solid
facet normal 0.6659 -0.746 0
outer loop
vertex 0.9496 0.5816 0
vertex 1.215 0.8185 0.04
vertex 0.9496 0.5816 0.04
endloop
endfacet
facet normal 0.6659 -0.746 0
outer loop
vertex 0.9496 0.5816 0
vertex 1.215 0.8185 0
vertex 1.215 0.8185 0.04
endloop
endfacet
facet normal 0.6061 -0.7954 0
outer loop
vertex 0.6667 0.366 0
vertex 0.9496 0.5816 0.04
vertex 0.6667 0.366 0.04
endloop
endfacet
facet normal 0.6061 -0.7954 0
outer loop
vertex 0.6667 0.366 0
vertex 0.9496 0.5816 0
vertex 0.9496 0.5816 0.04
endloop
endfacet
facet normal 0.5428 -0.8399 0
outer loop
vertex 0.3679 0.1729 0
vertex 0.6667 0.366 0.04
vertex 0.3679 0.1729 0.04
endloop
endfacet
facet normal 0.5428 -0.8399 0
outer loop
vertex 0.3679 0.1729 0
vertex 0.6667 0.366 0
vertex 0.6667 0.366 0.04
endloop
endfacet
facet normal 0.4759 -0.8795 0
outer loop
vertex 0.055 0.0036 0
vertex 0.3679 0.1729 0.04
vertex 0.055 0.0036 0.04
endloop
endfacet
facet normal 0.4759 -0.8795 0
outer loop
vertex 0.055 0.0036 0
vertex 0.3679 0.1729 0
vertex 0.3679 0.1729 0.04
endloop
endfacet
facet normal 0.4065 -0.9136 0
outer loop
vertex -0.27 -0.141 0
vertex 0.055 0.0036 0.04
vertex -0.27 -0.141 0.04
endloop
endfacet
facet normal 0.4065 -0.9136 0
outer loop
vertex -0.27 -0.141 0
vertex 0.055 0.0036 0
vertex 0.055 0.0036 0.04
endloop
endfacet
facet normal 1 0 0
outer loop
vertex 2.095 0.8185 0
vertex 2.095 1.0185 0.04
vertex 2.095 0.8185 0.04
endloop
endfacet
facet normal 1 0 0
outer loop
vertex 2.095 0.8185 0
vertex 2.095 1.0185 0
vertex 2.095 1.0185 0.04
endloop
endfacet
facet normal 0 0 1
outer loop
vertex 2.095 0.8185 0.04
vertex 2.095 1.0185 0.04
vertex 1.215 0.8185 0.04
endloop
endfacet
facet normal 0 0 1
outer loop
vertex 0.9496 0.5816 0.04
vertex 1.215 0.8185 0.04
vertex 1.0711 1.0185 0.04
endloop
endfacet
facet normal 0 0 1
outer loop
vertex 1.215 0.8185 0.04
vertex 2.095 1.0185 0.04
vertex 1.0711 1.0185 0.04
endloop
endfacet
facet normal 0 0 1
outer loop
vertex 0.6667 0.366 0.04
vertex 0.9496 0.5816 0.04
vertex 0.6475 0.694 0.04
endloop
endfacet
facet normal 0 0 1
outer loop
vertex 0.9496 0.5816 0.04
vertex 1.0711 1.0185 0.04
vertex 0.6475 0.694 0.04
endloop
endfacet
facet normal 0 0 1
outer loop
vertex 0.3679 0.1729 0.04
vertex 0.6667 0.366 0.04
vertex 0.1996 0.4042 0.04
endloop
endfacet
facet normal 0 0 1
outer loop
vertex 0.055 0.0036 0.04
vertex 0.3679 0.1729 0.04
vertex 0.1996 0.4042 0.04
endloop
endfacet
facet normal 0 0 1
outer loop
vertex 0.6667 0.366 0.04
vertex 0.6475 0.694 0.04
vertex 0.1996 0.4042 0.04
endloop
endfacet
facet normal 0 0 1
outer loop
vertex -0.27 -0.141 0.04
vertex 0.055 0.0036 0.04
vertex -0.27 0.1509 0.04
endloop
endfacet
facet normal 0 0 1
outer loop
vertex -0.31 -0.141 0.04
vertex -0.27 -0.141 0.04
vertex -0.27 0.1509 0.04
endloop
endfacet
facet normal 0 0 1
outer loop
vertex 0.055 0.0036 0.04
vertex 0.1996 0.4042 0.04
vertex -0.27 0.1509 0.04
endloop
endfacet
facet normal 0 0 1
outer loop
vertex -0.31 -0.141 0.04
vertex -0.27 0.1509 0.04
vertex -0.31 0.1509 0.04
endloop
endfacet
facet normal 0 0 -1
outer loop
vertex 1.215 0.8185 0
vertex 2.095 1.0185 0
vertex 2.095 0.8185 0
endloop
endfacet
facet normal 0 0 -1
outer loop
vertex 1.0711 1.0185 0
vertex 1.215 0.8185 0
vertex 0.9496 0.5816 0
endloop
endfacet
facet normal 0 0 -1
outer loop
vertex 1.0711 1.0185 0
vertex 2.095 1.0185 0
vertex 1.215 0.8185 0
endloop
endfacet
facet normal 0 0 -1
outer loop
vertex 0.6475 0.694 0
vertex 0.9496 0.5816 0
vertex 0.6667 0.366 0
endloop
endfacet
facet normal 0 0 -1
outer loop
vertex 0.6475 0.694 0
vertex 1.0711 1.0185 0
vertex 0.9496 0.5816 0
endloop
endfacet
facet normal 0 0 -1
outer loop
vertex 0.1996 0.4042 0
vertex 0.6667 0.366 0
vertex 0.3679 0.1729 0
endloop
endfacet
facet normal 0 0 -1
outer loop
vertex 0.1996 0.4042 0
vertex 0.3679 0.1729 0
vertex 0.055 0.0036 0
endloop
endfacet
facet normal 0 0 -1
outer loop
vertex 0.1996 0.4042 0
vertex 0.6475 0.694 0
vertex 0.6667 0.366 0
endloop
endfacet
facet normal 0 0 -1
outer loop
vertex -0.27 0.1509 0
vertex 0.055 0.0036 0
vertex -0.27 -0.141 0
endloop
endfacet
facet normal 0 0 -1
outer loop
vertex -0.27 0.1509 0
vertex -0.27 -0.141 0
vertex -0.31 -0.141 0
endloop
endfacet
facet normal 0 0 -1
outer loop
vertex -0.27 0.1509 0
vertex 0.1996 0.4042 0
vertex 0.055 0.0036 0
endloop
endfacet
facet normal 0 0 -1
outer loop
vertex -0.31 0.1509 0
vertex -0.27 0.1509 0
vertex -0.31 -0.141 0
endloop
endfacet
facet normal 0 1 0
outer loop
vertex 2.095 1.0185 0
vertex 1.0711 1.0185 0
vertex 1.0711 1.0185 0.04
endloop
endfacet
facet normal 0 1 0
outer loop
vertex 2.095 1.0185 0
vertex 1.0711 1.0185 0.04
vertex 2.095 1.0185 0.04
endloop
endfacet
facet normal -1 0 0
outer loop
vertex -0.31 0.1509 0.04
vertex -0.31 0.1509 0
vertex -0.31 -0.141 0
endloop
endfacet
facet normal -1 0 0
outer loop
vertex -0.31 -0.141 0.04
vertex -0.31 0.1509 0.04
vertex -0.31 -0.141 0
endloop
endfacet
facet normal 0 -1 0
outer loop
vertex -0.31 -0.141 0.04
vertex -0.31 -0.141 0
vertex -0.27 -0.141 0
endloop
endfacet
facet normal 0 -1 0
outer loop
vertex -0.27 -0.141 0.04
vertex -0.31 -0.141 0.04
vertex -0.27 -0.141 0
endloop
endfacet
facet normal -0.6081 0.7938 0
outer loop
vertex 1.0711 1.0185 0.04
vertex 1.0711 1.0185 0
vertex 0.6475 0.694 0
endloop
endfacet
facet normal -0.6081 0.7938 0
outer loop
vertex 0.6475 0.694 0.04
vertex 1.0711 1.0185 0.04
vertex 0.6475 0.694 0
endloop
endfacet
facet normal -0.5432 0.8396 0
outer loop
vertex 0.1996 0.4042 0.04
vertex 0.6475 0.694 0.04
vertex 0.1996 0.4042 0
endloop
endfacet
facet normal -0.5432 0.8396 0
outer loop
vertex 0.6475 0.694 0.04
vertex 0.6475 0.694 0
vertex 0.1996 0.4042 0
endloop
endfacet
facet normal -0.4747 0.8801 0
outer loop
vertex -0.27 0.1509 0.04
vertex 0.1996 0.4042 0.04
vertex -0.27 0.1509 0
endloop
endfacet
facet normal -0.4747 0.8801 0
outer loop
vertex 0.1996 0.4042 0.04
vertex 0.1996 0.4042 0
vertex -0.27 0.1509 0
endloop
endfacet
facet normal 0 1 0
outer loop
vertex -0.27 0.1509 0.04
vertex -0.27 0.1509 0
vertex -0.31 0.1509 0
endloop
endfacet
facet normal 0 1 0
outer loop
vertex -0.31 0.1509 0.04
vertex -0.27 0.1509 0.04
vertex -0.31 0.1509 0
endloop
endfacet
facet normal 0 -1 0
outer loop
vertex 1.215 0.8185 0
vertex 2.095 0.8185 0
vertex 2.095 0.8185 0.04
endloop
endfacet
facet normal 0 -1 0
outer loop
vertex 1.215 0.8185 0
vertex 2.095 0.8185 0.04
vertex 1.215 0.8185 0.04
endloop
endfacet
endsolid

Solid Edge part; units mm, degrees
sketch "Sketch1" plane through (0, 0, 0) normal (0, 0, 1) x (1, 0, 0)
  line L0 (2.095, 1.0185) -> (2.095, 0.8185)
  line L1 (2.095, 0.8185) -> (1.215, 0.8185)
  arc A0 (1.215, 0.8185) -> (-0.27, -0.141) centre (-1.9718, 4.1216) cw
  line L2 (-0.31, -0.141) -> (-0.27, -0.141)
  line L3 (-0.31, 0.1509) -> (-0.31, -0.141)
  line L4 (-0.27, 0.1509) -> (-0.31, 0.1509)
  arc A1 (1.0711, 1.0185) -> (-0.27, 0.1509) centre (-3.2213, 6.1831) cw
  line L5 (1.0711, 1.0185) -> (2.095, 1.0185)
  dimension "D1" = 0.2
  dimension "D2" = 0.88
extrude "Protrusion1" add sketch "Sketch1" along normal blind 0.04
